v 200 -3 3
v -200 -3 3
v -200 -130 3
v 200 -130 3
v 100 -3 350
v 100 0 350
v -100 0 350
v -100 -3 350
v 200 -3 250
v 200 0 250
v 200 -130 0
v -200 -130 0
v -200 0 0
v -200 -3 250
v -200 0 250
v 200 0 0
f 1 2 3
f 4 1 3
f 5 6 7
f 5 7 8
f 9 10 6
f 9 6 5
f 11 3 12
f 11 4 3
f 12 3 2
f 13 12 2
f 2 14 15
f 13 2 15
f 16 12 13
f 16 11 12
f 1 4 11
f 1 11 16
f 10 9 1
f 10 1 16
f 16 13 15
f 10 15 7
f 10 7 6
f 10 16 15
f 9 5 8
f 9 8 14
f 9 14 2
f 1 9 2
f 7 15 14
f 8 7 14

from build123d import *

# Parameters (mm, degrees)
F1_DEPTH = 200
F2_SIZE  = 100


with BuildPart() as f1:
    # F0 (on Right) → F1 (new body, symmetric)
    with BuildSketch(Plane.YZ):
        Polygon((-130, 0), (0, 0), (0, 350), (-3, 350), (-3, 3), (-130, 3), align=None)
    extrude(amount=F1_DEPTH, both=True)

    # F2
    f2_edges = [f1.edges().sort_by_distance(p)[0] for p in [
        (200, -1.5, 350),
        (-200, -1.5, 350),
    ]]
    chamfer(f2_edges, length=F2_SIZE)


solid = f1.part
